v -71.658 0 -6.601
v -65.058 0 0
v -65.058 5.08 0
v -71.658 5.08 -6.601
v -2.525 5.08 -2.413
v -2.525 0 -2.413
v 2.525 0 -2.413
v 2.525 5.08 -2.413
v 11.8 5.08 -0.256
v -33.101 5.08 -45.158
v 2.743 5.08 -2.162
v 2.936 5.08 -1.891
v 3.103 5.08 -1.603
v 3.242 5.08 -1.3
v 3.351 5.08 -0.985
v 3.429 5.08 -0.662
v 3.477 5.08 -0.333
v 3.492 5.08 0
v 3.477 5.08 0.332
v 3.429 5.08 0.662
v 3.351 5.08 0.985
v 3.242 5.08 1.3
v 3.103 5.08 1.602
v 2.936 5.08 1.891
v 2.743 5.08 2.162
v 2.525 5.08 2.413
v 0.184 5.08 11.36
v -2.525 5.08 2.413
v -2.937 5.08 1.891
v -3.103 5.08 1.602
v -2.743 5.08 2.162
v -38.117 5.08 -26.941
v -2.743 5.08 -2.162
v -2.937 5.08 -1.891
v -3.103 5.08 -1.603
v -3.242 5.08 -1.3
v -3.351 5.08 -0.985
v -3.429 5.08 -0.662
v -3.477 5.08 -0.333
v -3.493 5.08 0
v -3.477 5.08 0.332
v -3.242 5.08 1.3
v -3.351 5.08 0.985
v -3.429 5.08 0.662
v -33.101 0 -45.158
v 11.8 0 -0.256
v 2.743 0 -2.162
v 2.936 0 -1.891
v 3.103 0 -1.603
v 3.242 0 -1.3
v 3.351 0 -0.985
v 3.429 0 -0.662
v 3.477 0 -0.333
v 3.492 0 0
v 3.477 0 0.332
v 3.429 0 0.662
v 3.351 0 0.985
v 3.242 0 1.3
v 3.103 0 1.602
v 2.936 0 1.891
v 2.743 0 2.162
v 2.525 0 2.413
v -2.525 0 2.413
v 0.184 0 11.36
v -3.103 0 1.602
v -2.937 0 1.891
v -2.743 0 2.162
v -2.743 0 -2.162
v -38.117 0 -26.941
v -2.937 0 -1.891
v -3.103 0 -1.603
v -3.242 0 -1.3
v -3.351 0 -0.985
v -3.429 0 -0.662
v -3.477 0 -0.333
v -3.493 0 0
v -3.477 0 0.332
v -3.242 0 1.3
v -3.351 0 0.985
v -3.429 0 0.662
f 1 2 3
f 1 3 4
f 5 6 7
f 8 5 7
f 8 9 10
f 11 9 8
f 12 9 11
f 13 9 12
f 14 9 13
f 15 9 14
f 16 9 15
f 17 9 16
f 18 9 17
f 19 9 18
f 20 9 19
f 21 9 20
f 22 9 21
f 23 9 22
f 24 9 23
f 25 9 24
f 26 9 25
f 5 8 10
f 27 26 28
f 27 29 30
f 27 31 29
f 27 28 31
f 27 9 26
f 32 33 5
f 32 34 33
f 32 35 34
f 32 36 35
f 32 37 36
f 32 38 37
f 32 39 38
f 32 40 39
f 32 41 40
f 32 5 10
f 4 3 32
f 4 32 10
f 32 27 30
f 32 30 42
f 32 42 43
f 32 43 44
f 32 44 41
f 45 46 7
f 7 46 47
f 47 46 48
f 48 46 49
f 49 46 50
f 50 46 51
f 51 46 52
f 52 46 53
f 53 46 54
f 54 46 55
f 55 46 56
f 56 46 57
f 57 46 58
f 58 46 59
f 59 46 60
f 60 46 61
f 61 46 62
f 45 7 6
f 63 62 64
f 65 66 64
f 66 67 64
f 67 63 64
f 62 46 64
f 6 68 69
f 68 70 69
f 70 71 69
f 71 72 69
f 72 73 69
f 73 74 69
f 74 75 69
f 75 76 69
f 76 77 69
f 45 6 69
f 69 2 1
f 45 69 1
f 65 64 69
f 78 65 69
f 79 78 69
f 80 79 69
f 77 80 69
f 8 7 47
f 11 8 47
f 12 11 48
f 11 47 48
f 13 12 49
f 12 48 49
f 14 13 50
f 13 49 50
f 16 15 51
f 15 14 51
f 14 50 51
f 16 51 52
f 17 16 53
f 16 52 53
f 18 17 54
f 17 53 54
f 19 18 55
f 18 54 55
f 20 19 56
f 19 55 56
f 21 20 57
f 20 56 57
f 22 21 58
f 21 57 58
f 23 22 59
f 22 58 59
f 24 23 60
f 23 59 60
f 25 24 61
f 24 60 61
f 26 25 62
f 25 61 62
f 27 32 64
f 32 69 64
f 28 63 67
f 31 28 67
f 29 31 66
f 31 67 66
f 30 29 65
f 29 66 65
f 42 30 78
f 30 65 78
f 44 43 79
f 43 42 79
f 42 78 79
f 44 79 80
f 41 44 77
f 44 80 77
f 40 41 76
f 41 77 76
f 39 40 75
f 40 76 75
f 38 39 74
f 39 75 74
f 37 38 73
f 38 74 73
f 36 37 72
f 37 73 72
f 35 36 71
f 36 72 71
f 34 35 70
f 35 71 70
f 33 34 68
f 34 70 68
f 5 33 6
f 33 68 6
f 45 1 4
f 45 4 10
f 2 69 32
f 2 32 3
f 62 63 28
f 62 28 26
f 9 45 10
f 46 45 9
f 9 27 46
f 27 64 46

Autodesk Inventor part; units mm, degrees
ref_plane "YZ Plane" through (0, 0, 0) normal (1, 0, 0) x (0, 1, 0)
ref_plane "XZ Plane" through (0, 0, 0) normal (0, 1, 0) x (-1, 0, 0)
ref_plane "XY Plane" through (0, 0, 0) normal (0, 0, 1) x (1, 0, 0)
sketch "Sketch1" plane through (0, 0, 0) normal (0, 1, 0) x (-1, 0, 0)
  line L0 (38.1169, -26.9408) -> (65.0577, -0.0001)
  line L1 (71.6583, -6.6007) -> (33.1013, -45.1577)
  line L2 (65.0577, -0.0001) -> (71.6583, -6.6007)
  circle A0 centre (0.0001, -0.0001) radius 0.88
  line L3 (2.525, 2.4129) -> (-2.5248, 2.4129)
  line L4 (2.525, -2.4131) -> (-2.5248, -2.4131)
  arc A1 (-2.5248, 2.4129) -> (-2.5248, -2.4131) centre (0.0001, -0.0001) ccw
  arc A2 (2.525, -2.4131) -> (2.525, 2.4129) centre (0.0001, -0.0001) ccw
  line L5 (38.1169, -26.9408) -> (-0.1838, 11.3598)
  line L6 (-0.1838, 11.3598) -> (-11.8, -0.2564)
  line L7 (33.1013, -45.1577) -> (-11.8, -0.2564)
  dimension "d12" = 1.76
  dimension "d14" = 4.826
  dimension "d17" = 63.5
  dimension "d25" = 3.4925
extrude "Extrusion1" add sketch "Sketch1" along normal blind 5.08 contours L0 L2 L1 L7 L6 L5
sketch "Sketch2" plane through (0, 5.08, 0) normal (0, 1, 0) x (1, 0, 0)
  line L0 (-33.1013, 45.1577) -> (-71.6583, 6.6007) projected
  line L1 (-71.6583, 6.6007) -> (-65.0577, 0.0001) projected
  line L2 (-65.0577, 0.0001) -> (-38.1169, 26.9408) projected
  line L3 (-38.1169, 26.9408) -> (0.1838, -11.3598) projected
  line L4 (0.1838, -11.3598) -> (11.8, 0.2564) projected
  line L5 (11.8, 0.2564) -> (-33.1013, 45.1577) projected
  arc A0 (-2.525, 2.4131) -> (-2.525, -2.4129) centre (-0.0001, 0.0001) ccw projected
  line L6 (-2.525, 2.4131) -> (2.5248, 2.4131) projected
  arc A1 (2.5248, -2.4129) -> (2.5248, 2.4131) centre (-0.0001, 0.0001) ccw projected
  line L7 (2.5248, -2.4129) -> (-2.525, -2.4129) projected
  point P0 (0, 0)
properties part number "gripper (moving part"
